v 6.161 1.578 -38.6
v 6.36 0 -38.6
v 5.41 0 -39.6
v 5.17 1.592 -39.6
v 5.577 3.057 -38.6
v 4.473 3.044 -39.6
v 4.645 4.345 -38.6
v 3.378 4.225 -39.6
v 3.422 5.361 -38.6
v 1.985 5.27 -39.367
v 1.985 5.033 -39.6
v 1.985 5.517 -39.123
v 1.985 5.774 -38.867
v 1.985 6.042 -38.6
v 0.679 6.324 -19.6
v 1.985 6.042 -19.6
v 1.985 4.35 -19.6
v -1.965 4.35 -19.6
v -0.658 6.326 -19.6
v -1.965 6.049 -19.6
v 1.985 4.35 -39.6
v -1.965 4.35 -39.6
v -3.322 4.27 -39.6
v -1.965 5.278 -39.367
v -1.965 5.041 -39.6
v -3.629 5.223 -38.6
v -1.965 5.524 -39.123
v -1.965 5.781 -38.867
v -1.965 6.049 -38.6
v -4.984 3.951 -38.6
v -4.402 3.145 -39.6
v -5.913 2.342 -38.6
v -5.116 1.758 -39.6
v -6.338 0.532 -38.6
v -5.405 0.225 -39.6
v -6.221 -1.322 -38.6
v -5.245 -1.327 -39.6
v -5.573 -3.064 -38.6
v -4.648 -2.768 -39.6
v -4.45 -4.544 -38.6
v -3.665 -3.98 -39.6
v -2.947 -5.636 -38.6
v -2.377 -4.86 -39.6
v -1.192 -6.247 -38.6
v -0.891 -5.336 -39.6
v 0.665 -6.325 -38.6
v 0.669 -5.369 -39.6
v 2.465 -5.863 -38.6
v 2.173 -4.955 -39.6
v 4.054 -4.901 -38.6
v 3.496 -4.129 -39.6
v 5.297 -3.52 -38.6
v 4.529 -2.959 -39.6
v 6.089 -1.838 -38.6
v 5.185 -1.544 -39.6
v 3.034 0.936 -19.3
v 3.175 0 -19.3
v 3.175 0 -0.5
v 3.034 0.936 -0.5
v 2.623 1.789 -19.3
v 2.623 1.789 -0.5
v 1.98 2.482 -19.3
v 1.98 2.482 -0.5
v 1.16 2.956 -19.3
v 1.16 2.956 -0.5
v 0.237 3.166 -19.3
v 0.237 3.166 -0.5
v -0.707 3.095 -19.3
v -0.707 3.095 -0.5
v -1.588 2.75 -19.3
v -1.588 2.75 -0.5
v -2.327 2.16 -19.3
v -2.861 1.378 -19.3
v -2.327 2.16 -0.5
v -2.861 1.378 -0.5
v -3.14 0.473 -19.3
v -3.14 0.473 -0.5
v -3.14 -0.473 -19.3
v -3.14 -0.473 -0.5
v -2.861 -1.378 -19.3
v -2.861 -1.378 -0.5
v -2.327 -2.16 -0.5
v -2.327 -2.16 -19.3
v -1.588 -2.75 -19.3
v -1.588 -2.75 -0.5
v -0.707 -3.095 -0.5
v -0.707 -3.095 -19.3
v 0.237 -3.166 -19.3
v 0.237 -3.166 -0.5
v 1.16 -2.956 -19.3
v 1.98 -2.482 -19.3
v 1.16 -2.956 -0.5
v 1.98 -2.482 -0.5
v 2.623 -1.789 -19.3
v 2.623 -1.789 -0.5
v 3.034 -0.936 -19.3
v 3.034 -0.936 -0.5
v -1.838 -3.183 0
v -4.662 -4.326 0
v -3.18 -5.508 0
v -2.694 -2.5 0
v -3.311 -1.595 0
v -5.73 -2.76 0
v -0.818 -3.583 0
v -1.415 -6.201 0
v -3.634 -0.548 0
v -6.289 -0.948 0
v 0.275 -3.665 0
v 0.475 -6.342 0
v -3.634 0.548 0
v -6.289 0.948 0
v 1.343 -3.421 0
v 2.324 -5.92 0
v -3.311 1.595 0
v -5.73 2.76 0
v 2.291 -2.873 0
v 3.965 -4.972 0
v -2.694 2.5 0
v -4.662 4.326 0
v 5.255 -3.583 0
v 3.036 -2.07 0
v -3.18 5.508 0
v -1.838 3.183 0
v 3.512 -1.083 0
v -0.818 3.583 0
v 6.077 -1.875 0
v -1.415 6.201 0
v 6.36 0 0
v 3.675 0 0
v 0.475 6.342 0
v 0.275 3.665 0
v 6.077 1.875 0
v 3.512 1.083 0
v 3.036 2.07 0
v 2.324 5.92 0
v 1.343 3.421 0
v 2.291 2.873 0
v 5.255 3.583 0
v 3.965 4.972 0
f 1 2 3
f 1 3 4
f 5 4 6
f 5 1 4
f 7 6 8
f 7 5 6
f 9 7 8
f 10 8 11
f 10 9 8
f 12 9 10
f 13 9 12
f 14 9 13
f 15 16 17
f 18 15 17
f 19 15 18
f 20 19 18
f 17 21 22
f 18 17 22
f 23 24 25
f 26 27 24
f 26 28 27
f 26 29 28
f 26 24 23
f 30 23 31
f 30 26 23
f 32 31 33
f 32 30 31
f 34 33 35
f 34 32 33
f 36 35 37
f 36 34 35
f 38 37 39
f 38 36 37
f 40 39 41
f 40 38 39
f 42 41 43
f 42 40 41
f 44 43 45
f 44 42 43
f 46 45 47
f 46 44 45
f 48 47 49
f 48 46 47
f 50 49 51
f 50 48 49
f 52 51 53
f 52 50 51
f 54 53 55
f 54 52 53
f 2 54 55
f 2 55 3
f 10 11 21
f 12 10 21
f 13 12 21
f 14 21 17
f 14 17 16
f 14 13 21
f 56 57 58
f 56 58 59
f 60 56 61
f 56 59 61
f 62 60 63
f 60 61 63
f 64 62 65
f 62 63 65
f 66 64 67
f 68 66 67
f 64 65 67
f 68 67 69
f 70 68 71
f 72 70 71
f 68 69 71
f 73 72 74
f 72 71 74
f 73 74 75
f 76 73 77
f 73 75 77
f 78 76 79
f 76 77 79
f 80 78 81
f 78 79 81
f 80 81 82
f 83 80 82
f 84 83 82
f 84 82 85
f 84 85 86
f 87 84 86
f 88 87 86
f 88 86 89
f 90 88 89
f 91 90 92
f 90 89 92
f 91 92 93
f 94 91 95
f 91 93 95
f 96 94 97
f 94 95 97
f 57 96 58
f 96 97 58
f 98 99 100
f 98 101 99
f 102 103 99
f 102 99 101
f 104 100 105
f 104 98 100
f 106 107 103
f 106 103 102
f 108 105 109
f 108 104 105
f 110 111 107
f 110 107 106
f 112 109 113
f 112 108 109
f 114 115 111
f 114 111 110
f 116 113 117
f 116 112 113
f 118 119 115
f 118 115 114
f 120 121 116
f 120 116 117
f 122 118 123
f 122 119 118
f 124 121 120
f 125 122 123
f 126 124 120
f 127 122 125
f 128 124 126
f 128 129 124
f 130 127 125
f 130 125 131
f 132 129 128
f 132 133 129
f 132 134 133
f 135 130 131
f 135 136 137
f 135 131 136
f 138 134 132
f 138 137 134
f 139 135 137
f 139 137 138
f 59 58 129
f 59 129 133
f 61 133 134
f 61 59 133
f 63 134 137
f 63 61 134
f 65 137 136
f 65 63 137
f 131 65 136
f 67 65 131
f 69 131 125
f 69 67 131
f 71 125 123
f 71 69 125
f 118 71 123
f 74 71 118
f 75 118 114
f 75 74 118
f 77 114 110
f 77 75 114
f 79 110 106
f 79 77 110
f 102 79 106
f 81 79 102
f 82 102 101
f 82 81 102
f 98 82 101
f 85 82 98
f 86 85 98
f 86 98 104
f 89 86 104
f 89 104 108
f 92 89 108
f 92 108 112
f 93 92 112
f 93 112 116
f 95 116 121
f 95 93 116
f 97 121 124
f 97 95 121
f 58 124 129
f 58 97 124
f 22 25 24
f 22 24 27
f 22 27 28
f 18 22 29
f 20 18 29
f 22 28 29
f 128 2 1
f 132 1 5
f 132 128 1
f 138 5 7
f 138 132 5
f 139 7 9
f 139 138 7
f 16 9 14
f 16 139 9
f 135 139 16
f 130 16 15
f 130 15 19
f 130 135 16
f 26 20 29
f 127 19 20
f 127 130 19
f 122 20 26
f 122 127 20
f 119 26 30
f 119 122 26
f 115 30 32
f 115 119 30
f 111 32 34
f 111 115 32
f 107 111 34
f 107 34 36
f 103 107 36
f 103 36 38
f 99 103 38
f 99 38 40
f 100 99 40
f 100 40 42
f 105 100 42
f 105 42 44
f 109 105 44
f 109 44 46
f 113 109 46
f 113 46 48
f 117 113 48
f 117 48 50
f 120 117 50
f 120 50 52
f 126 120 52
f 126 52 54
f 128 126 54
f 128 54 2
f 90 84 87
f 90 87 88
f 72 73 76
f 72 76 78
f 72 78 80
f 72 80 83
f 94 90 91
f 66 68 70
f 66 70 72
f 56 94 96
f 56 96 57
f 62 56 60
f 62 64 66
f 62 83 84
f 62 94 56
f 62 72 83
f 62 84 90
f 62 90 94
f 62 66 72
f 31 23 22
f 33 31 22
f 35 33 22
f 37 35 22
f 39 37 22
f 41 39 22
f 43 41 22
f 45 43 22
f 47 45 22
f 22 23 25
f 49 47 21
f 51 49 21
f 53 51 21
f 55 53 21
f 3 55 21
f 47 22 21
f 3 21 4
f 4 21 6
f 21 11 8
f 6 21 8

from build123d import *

# Parameters (mm, degrees)
CROQUIS3_R              = 6.36
SALIENTE_EXTRUIR2_DEPTH = 39.6
CROQUIS4_R              = 3.175
CORTAR_EXTRUIR1_DEPTH   = 19.3
CROQUIS6_W              = 3.95
CROQUIS6_H              = 2.393963958
CORTAR_EXTRUIR3_DEPTH   = 20
CHAFL_N1_SIZE           = 0.95
CHAFL_N1_SIZE2          = 1
CHAFL_N2_SIZE           = 0.5


with BuildPart() as part:
    # Croquis3 → Saliente-Extruir2 (new body)
    with BuildSketch(Plane.XY):
        Circle(CROQUIS3_R)
    extrude(amount=-SALIENTE_EXTRUIR2_DEPTH)

    # Croquis4 → Cortar-Extruir1 (cut)
    with BuildSketch(Plane.XY):
        Circle(CROQUIS4_R)
    extrude(amount=-CORTAR_EXTRUIR1_DEPTH, mode=Mode.SUBTRACT)

    # Croquis6 → Cortar-Extruir3 (cut)
    with BuildSketch(Plane(origin=(0, 0, -39.6), x_dir=(-1, 0, 0), z_dir=(0, 0, -1))):
        with Locations((-0.01, 5.546981979)):
            Rectangle(CROQUIS6_W, CROQUIS6_H)
    extrude(amount=-CORTAR_EXTRUIR3_DEPTH, mode=Mode.SUBTRACT)

    # Chaflán1
    chafl_n1_edges = [part.edges().sort_by_distance(p)[0] for p in [
        (-3.738462251, -5.145240519, -39.6),
    ]]
    chafl_n1_side = [part.faces().sort_by_distance(p)[0] for p in [
        (-0.000560241, -0.334162106, -39.6),
    ]]
    chamfer(chafl_n1_edges, length=CHAFL_N1_SIZE, length2=CHAFL_N1_SIZE2, reference=chafl_n1_side[0])

    # Chaflán2
    chafl_n2_edges = [part.edges().sort_by_distance(p)[0] for p in [
        (-3.175, 0, 0),
    ]]
    chamfer(chafl_n2_edges, length=CHAFL_N2_SIZE)


solid = part.part
